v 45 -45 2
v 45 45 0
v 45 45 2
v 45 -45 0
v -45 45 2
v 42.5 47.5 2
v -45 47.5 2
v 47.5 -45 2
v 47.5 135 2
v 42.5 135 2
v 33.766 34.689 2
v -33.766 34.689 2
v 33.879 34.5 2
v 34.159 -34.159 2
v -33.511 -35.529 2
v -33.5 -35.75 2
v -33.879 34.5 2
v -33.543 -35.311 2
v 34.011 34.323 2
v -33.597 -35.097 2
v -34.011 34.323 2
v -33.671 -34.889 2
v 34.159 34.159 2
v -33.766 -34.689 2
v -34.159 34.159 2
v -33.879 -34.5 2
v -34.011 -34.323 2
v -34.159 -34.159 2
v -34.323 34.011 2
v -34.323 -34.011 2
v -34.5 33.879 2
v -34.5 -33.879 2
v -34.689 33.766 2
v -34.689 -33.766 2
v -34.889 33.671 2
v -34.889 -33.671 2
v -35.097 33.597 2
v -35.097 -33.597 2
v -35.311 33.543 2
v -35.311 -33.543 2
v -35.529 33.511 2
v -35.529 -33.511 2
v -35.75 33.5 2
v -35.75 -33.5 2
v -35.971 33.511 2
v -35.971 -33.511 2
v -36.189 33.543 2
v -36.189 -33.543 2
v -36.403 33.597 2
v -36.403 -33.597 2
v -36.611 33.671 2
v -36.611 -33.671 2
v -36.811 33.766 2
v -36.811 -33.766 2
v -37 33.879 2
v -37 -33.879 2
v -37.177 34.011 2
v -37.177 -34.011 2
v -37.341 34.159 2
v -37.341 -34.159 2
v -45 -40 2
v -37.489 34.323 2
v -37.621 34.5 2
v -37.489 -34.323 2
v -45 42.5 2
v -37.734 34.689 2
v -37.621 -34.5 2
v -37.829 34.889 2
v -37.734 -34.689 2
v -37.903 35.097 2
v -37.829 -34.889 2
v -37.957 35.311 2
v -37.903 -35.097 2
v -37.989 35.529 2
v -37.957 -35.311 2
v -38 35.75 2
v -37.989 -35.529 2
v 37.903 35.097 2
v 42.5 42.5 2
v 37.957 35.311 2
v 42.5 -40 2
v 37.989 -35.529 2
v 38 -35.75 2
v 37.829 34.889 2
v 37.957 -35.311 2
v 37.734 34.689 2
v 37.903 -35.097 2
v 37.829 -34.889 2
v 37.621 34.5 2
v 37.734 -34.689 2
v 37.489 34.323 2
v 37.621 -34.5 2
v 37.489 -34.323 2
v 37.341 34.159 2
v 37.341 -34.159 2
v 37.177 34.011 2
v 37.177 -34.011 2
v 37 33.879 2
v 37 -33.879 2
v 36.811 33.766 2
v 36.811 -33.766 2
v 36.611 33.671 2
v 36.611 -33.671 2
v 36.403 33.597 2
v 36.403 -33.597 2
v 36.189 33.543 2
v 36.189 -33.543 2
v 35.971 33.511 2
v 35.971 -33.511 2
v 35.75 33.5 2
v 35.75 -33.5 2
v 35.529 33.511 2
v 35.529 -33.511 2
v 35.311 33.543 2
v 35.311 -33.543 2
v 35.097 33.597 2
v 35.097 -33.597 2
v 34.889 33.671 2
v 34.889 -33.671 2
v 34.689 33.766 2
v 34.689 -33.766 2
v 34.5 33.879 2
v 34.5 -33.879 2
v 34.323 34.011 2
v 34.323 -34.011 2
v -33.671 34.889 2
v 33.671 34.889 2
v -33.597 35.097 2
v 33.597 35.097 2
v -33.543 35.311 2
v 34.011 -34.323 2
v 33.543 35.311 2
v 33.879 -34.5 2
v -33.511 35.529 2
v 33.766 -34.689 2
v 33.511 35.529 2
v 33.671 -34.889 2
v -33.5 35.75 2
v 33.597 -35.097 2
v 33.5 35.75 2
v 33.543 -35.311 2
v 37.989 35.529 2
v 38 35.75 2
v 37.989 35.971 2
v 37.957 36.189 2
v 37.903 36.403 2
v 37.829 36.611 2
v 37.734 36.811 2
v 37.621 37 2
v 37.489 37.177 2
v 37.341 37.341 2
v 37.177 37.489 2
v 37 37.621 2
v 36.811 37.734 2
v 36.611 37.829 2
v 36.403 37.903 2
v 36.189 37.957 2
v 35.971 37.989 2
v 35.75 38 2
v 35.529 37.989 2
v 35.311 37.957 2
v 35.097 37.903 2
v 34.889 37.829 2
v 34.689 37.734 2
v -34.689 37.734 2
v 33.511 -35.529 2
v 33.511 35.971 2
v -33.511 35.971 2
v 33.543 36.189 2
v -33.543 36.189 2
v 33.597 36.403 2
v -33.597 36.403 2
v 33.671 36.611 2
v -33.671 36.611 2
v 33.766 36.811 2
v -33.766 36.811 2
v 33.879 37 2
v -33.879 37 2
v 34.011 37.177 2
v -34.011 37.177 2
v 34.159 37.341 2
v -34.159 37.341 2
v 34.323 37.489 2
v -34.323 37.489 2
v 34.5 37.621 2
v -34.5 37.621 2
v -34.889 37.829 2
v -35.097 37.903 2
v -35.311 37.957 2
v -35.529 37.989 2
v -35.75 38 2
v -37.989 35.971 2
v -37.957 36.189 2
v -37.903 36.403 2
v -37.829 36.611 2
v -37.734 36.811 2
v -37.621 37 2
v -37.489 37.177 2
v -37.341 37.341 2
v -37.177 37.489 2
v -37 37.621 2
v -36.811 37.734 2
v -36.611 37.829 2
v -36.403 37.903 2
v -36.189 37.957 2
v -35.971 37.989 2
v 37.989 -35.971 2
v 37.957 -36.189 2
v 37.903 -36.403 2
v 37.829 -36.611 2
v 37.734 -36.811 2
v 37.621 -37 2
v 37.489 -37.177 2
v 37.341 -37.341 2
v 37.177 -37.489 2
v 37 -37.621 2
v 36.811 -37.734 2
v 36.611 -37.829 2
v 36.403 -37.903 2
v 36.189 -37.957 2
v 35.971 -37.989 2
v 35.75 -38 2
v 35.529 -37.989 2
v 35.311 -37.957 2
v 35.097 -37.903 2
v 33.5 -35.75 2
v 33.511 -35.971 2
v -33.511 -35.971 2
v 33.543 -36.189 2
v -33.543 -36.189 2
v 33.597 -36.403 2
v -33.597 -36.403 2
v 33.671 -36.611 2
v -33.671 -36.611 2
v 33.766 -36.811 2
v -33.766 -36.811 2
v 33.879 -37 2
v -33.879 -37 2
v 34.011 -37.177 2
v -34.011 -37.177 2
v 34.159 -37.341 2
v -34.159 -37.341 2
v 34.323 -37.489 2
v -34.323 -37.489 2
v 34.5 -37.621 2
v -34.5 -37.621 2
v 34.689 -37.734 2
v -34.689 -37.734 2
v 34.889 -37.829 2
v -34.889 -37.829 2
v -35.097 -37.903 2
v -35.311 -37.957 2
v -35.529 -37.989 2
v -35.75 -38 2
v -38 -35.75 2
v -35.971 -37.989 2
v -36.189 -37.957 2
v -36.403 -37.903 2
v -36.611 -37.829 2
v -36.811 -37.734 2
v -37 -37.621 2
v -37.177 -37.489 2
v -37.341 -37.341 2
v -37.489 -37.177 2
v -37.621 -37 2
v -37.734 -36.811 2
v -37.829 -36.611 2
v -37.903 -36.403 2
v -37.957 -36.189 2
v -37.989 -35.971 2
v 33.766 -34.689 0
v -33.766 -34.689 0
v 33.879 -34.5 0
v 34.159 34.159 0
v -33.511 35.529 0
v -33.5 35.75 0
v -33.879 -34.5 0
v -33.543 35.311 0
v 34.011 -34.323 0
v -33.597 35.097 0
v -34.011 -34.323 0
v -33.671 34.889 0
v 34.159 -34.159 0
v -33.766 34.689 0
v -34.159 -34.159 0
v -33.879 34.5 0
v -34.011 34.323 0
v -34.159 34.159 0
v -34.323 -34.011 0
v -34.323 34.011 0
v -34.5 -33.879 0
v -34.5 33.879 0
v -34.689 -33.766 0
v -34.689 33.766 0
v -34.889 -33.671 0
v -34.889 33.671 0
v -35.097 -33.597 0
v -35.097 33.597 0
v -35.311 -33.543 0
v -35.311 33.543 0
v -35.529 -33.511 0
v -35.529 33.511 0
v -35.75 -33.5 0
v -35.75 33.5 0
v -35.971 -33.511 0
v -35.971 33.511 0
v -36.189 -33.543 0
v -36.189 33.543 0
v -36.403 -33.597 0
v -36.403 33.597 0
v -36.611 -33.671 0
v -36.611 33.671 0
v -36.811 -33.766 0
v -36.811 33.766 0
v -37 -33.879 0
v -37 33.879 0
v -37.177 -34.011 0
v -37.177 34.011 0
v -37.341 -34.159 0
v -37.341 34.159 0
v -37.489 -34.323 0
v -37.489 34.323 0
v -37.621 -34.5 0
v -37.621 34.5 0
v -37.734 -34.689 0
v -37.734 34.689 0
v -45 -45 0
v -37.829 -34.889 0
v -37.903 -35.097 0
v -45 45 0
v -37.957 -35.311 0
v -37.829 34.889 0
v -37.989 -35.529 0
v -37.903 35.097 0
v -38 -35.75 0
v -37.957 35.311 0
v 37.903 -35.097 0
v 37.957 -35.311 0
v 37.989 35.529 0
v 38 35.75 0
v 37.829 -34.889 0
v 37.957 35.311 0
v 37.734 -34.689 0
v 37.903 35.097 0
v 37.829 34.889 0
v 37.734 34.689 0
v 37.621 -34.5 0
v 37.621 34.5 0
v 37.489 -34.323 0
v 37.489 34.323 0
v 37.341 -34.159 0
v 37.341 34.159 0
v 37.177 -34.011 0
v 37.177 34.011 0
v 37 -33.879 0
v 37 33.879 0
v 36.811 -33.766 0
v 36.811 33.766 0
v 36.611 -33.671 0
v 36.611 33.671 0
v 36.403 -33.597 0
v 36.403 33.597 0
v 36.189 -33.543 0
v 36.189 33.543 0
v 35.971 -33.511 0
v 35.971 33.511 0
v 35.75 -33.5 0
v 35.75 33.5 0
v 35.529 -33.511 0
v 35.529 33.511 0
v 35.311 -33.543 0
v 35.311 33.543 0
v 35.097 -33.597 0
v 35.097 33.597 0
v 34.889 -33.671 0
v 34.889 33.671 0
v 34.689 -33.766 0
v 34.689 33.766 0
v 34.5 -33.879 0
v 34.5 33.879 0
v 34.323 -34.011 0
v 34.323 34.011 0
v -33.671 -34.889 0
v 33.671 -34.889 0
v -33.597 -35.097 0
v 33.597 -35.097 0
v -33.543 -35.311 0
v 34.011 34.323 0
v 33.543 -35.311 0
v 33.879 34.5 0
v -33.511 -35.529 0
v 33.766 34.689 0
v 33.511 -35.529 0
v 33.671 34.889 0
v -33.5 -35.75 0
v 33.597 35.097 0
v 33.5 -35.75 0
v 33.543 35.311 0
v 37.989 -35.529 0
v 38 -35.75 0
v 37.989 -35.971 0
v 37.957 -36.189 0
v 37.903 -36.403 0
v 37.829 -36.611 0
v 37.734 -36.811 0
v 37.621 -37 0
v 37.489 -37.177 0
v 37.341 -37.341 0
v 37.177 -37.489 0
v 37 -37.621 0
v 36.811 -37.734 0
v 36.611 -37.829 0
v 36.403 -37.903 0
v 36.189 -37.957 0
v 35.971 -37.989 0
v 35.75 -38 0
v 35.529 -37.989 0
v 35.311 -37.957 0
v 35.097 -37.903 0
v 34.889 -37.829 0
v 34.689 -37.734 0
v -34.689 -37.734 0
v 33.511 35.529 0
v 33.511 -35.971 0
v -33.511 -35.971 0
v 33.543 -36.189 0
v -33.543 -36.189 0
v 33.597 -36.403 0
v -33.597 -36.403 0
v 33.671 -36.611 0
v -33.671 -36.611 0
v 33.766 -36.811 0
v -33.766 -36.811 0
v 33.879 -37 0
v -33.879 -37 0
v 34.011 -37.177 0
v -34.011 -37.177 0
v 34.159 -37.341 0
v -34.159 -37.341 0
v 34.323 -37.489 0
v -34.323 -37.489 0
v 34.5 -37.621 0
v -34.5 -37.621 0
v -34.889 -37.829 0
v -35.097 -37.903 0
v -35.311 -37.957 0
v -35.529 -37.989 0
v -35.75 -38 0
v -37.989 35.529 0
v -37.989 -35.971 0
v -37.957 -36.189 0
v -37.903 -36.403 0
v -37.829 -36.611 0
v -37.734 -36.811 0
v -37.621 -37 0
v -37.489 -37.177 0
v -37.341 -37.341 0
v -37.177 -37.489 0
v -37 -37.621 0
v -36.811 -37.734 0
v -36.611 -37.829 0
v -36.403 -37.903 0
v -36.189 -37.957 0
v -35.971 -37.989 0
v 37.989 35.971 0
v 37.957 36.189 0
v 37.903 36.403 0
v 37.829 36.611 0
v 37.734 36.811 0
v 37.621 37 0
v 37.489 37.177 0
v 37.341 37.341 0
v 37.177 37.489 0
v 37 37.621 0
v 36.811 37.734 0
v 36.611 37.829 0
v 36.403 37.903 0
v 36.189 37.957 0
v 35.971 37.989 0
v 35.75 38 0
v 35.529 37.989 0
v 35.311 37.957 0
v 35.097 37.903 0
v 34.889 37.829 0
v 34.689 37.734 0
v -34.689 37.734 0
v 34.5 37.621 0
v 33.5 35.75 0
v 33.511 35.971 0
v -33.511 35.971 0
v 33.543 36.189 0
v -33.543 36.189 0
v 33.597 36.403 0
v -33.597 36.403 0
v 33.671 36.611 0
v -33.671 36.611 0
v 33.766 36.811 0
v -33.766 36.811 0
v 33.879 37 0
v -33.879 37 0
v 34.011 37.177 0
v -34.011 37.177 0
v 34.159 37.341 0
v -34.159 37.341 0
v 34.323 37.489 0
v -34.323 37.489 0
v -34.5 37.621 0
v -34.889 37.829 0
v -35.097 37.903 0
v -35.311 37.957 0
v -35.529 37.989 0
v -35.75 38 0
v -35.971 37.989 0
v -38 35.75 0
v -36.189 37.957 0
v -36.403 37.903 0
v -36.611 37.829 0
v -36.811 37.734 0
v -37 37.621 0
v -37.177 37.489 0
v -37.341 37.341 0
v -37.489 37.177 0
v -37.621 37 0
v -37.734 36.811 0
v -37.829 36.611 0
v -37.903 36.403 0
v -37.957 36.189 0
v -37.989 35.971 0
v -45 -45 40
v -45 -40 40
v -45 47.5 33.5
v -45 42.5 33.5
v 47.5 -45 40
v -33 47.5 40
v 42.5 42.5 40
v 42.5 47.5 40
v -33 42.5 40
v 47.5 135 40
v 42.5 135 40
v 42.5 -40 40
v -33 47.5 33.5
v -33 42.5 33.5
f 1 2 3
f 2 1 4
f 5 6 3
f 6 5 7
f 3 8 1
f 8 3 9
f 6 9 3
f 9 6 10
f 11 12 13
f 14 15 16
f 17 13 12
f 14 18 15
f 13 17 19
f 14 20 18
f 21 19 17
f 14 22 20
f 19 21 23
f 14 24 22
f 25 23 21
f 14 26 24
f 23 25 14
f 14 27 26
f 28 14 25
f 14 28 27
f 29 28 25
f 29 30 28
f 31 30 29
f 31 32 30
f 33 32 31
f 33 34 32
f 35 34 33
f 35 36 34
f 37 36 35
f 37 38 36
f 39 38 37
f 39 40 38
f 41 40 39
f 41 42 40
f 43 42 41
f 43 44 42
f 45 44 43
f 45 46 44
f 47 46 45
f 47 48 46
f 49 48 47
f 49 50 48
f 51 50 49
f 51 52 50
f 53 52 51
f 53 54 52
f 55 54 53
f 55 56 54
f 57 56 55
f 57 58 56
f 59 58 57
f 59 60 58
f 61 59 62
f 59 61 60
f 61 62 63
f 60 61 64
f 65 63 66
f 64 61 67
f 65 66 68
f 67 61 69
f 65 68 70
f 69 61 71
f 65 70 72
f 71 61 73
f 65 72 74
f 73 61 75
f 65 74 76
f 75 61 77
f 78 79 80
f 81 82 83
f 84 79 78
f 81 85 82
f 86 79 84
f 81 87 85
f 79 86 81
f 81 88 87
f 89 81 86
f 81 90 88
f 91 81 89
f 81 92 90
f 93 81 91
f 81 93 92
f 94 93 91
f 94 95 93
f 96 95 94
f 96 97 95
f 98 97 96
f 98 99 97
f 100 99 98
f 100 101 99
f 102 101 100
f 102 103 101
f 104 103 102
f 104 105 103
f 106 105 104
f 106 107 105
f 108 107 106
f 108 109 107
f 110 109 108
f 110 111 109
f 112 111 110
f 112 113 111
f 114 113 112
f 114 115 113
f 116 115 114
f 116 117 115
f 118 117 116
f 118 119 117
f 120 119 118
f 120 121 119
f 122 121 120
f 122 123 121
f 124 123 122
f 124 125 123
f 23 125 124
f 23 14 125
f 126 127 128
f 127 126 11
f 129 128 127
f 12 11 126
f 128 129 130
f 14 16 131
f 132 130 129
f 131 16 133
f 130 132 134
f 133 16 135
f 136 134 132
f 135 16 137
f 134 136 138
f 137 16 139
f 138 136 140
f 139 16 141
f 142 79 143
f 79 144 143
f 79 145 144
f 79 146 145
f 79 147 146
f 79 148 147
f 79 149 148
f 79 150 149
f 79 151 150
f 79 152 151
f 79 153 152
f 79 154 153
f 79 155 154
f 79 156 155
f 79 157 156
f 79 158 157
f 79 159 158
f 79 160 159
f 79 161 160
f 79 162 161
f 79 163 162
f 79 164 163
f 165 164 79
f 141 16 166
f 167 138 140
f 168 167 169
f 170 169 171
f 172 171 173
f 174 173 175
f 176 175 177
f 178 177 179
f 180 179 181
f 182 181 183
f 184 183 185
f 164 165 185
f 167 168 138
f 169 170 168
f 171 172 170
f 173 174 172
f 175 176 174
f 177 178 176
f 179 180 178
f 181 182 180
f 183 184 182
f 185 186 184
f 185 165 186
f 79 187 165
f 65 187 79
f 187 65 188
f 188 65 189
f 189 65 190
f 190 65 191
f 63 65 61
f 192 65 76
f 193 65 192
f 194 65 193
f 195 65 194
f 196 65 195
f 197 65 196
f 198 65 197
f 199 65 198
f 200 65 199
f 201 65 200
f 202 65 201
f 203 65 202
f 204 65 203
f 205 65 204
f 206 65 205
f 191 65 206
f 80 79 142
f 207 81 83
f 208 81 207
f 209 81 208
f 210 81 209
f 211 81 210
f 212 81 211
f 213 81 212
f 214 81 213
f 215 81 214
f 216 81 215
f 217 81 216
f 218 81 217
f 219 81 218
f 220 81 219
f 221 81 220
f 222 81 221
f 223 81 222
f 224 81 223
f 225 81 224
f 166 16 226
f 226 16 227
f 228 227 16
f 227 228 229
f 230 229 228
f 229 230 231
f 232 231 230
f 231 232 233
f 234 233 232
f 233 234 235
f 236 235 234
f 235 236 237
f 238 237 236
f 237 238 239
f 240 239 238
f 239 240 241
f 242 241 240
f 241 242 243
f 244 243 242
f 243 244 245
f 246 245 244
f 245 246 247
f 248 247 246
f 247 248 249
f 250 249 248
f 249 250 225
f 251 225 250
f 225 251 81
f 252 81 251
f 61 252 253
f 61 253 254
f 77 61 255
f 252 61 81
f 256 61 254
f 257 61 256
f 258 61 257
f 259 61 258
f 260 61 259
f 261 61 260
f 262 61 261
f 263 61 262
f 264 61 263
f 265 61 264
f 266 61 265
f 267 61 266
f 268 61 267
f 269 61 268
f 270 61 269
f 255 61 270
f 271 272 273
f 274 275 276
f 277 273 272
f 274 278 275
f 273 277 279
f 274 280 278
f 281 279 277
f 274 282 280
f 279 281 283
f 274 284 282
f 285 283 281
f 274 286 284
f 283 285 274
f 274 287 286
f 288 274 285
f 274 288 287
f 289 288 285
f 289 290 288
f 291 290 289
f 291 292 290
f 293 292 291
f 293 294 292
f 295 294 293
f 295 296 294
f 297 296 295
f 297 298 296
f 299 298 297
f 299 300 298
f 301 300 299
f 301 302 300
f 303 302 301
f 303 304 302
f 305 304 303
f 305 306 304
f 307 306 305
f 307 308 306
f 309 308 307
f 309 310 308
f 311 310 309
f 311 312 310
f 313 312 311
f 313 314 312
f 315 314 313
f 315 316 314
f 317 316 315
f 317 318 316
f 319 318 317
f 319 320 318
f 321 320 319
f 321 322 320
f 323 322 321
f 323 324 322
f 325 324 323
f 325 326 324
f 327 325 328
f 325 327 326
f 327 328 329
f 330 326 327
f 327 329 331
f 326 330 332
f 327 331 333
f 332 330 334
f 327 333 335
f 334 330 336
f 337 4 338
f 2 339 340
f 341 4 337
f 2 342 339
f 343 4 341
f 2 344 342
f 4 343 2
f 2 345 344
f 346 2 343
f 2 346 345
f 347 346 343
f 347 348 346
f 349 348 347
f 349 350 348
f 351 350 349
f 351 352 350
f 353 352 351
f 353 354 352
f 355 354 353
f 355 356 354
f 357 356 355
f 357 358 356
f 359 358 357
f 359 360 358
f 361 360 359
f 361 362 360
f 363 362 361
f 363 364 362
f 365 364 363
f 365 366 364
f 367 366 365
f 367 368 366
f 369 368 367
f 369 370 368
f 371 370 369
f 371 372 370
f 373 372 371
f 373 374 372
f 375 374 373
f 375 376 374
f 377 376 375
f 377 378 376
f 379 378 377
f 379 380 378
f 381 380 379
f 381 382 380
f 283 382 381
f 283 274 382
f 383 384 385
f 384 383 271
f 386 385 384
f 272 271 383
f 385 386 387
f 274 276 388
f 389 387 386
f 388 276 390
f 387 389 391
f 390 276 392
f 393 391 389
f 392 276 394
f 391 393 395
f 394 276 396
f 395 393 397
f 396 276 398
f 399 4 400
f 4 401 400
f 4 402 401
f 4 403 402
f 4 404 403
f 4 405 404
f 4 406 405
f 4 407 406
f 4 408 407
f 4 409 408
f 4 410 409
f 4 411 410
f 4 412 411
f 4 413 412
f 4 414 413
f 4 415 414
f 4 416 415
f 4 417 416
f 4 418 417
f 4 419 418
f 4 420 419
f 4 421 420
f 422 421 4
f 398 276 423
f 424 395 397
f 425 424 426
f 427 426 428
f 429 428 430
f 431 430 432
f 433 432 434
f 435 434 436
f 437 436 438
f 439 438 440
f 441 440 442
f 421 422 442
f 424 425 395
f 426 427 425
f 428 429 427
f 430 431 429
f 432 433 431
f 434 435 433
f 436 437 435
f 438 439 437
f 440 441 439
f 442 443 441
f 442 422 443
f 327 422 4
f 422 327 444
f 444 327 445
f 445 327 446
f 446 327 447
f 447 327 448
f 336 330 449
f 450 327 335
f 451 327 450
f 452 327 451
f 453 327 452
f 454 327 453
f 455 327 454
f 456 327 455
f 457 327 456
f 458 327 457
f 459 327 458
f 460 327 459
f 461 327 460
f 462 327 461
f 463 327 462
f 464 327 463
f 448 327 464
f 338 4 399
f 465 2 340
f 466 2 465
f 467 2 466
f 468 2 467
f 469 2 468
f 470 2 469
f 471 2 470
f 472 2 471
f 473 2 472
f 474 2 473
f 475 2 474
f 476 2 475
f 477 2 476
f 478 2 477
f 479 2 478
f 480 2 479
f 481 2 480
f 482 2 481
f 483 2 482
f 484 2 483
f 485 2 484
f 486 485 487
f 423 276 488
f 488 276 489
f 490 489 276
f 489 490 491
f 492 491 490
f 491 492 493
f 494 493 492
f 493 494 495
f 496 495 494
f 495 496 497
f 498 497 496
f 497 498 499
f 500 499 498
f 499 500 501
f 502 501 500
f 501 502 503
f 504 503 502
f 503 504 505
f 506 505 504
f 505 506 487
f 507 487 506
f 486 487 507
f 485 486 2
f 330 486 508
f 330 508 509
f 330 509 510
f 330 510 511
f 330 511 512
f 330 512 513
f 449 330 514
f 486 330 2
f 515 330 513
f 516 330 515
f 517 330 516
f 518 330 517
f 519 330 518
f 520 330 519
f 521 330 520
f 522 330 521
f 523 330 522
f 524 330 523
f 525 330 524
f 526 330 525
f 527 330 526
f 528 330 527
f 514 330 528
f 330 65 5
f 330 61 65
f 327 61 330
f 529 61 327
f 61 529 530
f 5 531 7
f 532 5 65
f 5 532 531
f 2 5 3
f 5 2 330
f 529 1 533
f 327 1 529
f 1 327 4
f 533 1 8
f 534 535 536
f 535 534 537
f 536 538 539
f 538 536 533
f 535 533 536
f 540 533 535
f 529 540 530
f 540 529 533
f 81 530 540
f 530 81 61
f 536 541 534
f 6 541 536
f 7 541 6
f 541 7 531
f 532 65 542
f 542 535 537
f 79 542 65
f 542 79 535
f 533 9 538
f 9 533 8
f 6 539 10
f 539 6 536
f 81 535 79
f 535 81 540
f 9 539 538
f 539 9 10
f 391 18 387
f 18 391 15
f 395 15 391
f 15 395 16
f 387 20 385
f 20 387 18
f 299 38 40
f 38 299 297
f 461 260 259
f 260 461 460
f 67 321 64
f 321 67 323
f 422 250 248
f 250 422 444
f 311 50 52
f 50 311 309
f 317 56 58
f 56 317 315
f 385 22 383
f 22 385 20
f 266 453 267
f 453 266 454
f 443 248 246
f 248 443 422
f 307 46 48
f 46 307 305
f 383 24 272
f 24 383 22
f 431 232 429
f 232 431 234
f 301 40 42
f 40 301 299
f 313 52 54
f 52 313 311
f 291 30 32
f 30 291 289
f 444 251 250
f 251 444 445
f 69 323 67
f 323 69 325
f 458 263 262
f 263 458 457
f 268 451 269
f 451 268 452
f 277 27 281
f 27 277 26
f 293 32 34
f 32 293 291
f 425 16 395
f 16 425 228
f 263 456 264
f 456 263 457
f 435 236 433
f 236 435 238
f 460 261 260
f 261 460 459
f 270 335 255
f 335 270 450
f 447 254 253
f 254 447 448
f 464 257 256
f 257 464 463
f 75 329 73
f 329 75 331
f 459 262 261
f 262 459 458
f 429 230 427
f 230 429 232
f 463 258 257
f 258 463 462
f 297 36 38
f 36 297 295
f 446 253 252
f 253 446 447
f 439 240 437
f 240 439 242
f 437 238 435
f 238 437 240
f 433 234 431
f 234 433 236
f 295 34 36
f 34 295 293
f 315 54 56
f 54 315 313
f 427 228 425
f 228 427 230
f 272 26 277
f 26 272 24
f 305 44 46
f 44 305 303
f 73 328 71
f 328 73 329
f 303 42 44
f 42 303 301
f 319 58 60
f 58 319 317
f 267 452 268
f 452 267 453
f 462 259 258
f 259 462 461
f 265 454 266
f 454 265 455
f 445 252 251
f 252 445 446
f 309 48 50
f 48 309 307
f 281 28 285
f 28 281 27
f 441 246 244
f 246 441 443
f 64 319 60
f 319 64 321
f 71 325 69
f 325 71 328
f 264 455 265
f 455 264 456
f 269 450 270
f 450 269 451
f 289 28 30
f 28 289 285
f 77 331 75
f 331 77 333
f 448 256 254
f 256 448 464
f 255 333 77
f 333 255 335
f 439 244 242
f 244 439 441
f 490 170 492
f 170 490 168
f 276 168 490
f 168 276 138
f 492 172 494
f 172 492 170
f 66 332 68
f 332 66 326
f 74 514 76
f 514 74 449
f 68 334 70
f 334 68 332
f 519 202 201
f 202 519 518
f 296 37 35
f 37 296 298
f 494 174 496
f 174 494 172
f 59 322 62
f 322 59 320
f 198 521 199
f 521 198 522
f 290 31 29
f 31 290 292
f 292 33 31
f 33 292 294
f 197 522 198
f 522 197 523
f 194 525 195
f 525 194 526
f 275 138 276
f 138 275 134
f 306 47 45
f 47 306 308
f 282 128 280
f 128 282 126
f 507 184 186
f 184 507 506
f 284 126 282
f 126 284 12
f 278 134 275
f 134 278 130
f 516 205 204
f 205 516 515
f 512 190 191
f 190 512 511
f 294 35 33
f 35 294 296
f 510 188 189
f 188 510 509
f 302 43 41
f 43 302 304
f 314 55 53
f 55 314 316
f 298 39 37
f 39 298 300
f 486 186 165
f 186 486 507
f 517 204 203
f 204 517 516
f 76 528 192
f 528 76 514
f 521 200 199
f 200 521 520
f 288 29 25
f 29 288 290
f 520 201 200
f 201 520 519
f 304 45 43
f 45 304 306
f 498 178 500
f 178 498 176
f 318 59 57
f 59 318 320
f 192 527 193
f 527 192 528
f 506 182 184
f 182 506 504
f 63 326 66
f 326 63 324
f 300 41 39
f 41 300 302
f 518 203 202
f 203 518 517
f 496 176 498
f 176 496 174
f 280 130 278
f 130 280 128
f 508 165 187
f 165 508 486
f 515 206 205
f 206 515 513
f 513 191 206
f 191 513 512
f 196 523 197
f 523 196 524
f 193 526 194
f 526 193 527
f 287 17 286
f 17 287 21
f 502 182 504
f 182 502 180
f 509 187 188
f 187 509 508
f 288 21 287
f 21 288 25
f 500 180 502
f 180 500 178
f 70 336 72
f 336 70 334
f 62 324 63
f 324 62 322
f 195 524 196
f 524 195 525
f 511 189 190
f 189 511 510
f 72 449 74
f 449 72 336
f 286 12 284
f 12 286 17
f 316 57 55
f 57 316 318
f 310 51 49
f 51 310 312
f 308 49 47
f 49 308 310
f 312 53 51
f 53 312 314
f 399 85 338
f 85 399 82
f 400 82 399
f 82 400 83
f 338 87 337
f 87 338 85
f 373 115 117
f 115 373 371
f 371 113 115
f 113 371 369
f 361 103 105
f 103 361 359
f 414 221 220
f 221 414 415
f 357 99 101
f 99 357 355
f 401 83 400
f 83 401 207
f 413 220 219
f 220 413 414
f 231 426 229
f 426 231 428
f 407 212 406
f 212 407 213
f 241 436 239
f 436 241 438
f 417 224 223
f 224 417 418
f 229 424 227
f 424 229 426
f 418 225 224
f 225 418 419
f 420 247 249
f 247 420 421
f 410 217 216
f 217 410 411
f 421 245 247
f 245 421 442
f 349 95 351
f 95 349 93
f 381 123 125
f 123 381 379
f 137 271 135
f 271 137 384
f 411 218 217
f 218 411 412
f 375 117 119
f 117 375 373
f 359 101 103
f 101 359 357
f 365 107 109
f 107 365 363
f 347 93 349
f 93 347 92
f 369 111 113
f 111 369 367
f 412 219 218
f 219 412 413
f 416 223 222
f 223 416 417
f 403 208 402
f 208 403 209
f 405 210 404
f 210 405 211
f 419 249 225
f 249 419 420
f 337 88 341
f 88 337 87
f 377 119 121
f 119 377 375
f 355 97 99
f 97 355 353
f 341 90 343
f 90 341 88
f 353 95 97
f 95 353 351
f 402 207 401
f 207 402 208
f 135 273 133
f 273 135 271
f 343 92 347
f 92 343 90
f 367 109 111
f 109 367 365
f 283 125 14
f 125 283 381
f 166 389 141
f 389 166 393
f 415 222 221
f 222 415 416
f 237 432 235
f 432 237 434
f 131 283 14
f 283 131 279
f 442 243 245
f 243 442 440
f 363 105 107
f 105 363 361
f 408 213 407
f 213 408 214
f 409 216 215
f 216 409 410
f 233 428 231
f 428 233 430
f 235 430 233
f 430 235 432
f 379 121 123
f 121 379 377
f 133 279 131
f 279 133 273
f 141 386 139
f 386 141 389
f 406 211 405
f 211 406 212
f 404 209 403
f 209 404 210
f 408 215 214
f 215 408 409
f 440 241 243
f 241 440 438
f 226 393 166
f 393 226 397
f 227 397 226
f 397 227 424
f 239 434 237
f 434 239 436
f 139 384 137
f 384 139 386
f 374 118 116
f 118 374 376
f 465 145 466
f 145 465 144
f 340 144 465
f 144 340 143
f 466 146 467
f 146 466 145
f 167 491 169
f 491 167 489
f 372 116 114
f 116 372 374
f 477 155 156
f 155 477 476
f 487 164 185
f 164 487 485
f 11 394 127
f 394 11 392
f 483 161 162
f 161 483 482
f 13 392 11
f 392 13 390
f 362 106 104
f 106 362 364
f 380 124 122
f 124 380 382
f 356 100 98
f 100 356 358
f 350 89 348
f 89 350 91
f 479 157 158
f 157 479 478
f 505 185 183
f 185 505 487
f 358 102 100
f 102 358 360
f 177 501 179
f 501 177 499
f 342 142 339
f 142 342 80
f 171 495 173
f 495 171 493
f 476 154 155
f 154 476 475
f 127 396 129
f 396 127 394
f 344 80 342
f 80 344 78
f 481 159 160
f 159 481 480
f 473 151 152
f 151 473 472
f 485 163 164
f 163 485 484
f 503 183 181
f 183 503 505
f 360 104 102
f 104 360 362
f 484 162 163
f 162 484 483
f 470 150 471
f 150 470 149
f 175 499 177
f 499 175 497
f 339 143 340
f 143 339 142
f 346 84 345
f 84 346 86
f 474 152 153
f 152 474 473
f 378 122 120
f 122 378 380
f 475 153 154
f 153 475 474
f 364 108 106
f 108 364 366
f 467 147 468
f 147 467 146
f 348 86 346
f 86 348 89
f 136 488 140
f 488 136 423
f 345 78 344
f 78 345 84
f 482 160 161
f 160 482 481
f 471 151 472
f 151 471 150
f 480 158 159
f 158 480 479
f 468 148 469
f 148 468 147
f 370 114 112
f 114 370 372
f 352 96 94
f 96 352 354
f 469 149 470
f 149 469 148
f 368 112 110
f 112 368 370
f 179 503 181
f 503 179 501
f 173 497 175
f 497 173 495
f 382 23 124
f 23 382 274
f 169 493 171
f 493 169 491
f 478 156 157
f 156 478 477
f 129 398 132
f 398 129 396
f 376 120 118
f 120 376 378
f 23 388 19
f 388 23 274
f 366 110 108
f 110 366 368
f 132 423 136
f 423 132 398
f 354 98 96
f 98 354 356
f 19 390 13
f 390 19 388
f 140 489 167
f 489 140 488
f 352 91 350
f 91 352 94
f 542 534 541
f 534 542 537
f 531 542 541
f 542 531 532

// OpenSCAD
// Housing for a DIY magnetic stirrer built from an 80 mm PC case fan
// Printed upside down: top plate on the bed, box open at the top.

$fn = 64;

// ---- Dimensions (mm) ----
fan_outer      = 80;    // fan outer size (reference)
housing_outer  = 90;    // housing outer size (X x Y)
top_thick      = 2;     // top plate thickness (z = 0 to 2)
wall_thick     = 2.5;   // wall thickness
box_height     = 40;    // total height of box walls (open top at z = 40)
screw_pitch    = 71.5;  // square pitch for M4 screw holes
screw_d        = 4.5;   // M4 screw hole diameter
cable_w        = 12;    // cable notch width
cable_reach    = 8;     // notch depth from open edge (z = 32 to 40)

eps            = 0.5;   // cutter overshoot past faces

difference() {
    union() {
        // Top plate lying on the bed
        translate([-housing_outer/2, -housing_outer/2, 0])
            cube([housing_outer, housing_outer, top_thick]);
        // Four walls rising from the plate
        translate([-housing_outer/2, -housing_outer/2, top_thick])
            cube([housing_outer, 2*wall_thick, box_height - top_thick]);
        translate([-housing_outer/2, housing_outer/2 - wall_thick, top_thick])
            cube([housing_outer, 2*wall_thick, box_height - top_thick]);
        translate([housing_outer/2 - wall_thick, -housing_outer/2, top_thick])
            cube([2*wall_thick, housing_outer, box_height - top_thick]);
        translate([housing_outer/2 - wall_thick, housing_outer/2, top_thick])
            cube([2*wall_thick, housing_outer, box_height - top_thick]);
    }

    // Four M4 screw holes through the top plate, centred on the plate
    for (sx = [-screw_pitch/2, screw_pitch/2])
        for (sy = [-screw_pitch/2, screw_pitch/2])
            translate([sx, sy, -eps])
                cylinder(d = screw_d, h = top_thick + 2*eps);

    // Cable notch in one wall, centred along the wall
    translate([-housing_outer/2, 0, top_thick + box_height - cable_reach - eps])
        cube([cable_w, housing_outer + 2*eps, cable_reach + eps]);
}
